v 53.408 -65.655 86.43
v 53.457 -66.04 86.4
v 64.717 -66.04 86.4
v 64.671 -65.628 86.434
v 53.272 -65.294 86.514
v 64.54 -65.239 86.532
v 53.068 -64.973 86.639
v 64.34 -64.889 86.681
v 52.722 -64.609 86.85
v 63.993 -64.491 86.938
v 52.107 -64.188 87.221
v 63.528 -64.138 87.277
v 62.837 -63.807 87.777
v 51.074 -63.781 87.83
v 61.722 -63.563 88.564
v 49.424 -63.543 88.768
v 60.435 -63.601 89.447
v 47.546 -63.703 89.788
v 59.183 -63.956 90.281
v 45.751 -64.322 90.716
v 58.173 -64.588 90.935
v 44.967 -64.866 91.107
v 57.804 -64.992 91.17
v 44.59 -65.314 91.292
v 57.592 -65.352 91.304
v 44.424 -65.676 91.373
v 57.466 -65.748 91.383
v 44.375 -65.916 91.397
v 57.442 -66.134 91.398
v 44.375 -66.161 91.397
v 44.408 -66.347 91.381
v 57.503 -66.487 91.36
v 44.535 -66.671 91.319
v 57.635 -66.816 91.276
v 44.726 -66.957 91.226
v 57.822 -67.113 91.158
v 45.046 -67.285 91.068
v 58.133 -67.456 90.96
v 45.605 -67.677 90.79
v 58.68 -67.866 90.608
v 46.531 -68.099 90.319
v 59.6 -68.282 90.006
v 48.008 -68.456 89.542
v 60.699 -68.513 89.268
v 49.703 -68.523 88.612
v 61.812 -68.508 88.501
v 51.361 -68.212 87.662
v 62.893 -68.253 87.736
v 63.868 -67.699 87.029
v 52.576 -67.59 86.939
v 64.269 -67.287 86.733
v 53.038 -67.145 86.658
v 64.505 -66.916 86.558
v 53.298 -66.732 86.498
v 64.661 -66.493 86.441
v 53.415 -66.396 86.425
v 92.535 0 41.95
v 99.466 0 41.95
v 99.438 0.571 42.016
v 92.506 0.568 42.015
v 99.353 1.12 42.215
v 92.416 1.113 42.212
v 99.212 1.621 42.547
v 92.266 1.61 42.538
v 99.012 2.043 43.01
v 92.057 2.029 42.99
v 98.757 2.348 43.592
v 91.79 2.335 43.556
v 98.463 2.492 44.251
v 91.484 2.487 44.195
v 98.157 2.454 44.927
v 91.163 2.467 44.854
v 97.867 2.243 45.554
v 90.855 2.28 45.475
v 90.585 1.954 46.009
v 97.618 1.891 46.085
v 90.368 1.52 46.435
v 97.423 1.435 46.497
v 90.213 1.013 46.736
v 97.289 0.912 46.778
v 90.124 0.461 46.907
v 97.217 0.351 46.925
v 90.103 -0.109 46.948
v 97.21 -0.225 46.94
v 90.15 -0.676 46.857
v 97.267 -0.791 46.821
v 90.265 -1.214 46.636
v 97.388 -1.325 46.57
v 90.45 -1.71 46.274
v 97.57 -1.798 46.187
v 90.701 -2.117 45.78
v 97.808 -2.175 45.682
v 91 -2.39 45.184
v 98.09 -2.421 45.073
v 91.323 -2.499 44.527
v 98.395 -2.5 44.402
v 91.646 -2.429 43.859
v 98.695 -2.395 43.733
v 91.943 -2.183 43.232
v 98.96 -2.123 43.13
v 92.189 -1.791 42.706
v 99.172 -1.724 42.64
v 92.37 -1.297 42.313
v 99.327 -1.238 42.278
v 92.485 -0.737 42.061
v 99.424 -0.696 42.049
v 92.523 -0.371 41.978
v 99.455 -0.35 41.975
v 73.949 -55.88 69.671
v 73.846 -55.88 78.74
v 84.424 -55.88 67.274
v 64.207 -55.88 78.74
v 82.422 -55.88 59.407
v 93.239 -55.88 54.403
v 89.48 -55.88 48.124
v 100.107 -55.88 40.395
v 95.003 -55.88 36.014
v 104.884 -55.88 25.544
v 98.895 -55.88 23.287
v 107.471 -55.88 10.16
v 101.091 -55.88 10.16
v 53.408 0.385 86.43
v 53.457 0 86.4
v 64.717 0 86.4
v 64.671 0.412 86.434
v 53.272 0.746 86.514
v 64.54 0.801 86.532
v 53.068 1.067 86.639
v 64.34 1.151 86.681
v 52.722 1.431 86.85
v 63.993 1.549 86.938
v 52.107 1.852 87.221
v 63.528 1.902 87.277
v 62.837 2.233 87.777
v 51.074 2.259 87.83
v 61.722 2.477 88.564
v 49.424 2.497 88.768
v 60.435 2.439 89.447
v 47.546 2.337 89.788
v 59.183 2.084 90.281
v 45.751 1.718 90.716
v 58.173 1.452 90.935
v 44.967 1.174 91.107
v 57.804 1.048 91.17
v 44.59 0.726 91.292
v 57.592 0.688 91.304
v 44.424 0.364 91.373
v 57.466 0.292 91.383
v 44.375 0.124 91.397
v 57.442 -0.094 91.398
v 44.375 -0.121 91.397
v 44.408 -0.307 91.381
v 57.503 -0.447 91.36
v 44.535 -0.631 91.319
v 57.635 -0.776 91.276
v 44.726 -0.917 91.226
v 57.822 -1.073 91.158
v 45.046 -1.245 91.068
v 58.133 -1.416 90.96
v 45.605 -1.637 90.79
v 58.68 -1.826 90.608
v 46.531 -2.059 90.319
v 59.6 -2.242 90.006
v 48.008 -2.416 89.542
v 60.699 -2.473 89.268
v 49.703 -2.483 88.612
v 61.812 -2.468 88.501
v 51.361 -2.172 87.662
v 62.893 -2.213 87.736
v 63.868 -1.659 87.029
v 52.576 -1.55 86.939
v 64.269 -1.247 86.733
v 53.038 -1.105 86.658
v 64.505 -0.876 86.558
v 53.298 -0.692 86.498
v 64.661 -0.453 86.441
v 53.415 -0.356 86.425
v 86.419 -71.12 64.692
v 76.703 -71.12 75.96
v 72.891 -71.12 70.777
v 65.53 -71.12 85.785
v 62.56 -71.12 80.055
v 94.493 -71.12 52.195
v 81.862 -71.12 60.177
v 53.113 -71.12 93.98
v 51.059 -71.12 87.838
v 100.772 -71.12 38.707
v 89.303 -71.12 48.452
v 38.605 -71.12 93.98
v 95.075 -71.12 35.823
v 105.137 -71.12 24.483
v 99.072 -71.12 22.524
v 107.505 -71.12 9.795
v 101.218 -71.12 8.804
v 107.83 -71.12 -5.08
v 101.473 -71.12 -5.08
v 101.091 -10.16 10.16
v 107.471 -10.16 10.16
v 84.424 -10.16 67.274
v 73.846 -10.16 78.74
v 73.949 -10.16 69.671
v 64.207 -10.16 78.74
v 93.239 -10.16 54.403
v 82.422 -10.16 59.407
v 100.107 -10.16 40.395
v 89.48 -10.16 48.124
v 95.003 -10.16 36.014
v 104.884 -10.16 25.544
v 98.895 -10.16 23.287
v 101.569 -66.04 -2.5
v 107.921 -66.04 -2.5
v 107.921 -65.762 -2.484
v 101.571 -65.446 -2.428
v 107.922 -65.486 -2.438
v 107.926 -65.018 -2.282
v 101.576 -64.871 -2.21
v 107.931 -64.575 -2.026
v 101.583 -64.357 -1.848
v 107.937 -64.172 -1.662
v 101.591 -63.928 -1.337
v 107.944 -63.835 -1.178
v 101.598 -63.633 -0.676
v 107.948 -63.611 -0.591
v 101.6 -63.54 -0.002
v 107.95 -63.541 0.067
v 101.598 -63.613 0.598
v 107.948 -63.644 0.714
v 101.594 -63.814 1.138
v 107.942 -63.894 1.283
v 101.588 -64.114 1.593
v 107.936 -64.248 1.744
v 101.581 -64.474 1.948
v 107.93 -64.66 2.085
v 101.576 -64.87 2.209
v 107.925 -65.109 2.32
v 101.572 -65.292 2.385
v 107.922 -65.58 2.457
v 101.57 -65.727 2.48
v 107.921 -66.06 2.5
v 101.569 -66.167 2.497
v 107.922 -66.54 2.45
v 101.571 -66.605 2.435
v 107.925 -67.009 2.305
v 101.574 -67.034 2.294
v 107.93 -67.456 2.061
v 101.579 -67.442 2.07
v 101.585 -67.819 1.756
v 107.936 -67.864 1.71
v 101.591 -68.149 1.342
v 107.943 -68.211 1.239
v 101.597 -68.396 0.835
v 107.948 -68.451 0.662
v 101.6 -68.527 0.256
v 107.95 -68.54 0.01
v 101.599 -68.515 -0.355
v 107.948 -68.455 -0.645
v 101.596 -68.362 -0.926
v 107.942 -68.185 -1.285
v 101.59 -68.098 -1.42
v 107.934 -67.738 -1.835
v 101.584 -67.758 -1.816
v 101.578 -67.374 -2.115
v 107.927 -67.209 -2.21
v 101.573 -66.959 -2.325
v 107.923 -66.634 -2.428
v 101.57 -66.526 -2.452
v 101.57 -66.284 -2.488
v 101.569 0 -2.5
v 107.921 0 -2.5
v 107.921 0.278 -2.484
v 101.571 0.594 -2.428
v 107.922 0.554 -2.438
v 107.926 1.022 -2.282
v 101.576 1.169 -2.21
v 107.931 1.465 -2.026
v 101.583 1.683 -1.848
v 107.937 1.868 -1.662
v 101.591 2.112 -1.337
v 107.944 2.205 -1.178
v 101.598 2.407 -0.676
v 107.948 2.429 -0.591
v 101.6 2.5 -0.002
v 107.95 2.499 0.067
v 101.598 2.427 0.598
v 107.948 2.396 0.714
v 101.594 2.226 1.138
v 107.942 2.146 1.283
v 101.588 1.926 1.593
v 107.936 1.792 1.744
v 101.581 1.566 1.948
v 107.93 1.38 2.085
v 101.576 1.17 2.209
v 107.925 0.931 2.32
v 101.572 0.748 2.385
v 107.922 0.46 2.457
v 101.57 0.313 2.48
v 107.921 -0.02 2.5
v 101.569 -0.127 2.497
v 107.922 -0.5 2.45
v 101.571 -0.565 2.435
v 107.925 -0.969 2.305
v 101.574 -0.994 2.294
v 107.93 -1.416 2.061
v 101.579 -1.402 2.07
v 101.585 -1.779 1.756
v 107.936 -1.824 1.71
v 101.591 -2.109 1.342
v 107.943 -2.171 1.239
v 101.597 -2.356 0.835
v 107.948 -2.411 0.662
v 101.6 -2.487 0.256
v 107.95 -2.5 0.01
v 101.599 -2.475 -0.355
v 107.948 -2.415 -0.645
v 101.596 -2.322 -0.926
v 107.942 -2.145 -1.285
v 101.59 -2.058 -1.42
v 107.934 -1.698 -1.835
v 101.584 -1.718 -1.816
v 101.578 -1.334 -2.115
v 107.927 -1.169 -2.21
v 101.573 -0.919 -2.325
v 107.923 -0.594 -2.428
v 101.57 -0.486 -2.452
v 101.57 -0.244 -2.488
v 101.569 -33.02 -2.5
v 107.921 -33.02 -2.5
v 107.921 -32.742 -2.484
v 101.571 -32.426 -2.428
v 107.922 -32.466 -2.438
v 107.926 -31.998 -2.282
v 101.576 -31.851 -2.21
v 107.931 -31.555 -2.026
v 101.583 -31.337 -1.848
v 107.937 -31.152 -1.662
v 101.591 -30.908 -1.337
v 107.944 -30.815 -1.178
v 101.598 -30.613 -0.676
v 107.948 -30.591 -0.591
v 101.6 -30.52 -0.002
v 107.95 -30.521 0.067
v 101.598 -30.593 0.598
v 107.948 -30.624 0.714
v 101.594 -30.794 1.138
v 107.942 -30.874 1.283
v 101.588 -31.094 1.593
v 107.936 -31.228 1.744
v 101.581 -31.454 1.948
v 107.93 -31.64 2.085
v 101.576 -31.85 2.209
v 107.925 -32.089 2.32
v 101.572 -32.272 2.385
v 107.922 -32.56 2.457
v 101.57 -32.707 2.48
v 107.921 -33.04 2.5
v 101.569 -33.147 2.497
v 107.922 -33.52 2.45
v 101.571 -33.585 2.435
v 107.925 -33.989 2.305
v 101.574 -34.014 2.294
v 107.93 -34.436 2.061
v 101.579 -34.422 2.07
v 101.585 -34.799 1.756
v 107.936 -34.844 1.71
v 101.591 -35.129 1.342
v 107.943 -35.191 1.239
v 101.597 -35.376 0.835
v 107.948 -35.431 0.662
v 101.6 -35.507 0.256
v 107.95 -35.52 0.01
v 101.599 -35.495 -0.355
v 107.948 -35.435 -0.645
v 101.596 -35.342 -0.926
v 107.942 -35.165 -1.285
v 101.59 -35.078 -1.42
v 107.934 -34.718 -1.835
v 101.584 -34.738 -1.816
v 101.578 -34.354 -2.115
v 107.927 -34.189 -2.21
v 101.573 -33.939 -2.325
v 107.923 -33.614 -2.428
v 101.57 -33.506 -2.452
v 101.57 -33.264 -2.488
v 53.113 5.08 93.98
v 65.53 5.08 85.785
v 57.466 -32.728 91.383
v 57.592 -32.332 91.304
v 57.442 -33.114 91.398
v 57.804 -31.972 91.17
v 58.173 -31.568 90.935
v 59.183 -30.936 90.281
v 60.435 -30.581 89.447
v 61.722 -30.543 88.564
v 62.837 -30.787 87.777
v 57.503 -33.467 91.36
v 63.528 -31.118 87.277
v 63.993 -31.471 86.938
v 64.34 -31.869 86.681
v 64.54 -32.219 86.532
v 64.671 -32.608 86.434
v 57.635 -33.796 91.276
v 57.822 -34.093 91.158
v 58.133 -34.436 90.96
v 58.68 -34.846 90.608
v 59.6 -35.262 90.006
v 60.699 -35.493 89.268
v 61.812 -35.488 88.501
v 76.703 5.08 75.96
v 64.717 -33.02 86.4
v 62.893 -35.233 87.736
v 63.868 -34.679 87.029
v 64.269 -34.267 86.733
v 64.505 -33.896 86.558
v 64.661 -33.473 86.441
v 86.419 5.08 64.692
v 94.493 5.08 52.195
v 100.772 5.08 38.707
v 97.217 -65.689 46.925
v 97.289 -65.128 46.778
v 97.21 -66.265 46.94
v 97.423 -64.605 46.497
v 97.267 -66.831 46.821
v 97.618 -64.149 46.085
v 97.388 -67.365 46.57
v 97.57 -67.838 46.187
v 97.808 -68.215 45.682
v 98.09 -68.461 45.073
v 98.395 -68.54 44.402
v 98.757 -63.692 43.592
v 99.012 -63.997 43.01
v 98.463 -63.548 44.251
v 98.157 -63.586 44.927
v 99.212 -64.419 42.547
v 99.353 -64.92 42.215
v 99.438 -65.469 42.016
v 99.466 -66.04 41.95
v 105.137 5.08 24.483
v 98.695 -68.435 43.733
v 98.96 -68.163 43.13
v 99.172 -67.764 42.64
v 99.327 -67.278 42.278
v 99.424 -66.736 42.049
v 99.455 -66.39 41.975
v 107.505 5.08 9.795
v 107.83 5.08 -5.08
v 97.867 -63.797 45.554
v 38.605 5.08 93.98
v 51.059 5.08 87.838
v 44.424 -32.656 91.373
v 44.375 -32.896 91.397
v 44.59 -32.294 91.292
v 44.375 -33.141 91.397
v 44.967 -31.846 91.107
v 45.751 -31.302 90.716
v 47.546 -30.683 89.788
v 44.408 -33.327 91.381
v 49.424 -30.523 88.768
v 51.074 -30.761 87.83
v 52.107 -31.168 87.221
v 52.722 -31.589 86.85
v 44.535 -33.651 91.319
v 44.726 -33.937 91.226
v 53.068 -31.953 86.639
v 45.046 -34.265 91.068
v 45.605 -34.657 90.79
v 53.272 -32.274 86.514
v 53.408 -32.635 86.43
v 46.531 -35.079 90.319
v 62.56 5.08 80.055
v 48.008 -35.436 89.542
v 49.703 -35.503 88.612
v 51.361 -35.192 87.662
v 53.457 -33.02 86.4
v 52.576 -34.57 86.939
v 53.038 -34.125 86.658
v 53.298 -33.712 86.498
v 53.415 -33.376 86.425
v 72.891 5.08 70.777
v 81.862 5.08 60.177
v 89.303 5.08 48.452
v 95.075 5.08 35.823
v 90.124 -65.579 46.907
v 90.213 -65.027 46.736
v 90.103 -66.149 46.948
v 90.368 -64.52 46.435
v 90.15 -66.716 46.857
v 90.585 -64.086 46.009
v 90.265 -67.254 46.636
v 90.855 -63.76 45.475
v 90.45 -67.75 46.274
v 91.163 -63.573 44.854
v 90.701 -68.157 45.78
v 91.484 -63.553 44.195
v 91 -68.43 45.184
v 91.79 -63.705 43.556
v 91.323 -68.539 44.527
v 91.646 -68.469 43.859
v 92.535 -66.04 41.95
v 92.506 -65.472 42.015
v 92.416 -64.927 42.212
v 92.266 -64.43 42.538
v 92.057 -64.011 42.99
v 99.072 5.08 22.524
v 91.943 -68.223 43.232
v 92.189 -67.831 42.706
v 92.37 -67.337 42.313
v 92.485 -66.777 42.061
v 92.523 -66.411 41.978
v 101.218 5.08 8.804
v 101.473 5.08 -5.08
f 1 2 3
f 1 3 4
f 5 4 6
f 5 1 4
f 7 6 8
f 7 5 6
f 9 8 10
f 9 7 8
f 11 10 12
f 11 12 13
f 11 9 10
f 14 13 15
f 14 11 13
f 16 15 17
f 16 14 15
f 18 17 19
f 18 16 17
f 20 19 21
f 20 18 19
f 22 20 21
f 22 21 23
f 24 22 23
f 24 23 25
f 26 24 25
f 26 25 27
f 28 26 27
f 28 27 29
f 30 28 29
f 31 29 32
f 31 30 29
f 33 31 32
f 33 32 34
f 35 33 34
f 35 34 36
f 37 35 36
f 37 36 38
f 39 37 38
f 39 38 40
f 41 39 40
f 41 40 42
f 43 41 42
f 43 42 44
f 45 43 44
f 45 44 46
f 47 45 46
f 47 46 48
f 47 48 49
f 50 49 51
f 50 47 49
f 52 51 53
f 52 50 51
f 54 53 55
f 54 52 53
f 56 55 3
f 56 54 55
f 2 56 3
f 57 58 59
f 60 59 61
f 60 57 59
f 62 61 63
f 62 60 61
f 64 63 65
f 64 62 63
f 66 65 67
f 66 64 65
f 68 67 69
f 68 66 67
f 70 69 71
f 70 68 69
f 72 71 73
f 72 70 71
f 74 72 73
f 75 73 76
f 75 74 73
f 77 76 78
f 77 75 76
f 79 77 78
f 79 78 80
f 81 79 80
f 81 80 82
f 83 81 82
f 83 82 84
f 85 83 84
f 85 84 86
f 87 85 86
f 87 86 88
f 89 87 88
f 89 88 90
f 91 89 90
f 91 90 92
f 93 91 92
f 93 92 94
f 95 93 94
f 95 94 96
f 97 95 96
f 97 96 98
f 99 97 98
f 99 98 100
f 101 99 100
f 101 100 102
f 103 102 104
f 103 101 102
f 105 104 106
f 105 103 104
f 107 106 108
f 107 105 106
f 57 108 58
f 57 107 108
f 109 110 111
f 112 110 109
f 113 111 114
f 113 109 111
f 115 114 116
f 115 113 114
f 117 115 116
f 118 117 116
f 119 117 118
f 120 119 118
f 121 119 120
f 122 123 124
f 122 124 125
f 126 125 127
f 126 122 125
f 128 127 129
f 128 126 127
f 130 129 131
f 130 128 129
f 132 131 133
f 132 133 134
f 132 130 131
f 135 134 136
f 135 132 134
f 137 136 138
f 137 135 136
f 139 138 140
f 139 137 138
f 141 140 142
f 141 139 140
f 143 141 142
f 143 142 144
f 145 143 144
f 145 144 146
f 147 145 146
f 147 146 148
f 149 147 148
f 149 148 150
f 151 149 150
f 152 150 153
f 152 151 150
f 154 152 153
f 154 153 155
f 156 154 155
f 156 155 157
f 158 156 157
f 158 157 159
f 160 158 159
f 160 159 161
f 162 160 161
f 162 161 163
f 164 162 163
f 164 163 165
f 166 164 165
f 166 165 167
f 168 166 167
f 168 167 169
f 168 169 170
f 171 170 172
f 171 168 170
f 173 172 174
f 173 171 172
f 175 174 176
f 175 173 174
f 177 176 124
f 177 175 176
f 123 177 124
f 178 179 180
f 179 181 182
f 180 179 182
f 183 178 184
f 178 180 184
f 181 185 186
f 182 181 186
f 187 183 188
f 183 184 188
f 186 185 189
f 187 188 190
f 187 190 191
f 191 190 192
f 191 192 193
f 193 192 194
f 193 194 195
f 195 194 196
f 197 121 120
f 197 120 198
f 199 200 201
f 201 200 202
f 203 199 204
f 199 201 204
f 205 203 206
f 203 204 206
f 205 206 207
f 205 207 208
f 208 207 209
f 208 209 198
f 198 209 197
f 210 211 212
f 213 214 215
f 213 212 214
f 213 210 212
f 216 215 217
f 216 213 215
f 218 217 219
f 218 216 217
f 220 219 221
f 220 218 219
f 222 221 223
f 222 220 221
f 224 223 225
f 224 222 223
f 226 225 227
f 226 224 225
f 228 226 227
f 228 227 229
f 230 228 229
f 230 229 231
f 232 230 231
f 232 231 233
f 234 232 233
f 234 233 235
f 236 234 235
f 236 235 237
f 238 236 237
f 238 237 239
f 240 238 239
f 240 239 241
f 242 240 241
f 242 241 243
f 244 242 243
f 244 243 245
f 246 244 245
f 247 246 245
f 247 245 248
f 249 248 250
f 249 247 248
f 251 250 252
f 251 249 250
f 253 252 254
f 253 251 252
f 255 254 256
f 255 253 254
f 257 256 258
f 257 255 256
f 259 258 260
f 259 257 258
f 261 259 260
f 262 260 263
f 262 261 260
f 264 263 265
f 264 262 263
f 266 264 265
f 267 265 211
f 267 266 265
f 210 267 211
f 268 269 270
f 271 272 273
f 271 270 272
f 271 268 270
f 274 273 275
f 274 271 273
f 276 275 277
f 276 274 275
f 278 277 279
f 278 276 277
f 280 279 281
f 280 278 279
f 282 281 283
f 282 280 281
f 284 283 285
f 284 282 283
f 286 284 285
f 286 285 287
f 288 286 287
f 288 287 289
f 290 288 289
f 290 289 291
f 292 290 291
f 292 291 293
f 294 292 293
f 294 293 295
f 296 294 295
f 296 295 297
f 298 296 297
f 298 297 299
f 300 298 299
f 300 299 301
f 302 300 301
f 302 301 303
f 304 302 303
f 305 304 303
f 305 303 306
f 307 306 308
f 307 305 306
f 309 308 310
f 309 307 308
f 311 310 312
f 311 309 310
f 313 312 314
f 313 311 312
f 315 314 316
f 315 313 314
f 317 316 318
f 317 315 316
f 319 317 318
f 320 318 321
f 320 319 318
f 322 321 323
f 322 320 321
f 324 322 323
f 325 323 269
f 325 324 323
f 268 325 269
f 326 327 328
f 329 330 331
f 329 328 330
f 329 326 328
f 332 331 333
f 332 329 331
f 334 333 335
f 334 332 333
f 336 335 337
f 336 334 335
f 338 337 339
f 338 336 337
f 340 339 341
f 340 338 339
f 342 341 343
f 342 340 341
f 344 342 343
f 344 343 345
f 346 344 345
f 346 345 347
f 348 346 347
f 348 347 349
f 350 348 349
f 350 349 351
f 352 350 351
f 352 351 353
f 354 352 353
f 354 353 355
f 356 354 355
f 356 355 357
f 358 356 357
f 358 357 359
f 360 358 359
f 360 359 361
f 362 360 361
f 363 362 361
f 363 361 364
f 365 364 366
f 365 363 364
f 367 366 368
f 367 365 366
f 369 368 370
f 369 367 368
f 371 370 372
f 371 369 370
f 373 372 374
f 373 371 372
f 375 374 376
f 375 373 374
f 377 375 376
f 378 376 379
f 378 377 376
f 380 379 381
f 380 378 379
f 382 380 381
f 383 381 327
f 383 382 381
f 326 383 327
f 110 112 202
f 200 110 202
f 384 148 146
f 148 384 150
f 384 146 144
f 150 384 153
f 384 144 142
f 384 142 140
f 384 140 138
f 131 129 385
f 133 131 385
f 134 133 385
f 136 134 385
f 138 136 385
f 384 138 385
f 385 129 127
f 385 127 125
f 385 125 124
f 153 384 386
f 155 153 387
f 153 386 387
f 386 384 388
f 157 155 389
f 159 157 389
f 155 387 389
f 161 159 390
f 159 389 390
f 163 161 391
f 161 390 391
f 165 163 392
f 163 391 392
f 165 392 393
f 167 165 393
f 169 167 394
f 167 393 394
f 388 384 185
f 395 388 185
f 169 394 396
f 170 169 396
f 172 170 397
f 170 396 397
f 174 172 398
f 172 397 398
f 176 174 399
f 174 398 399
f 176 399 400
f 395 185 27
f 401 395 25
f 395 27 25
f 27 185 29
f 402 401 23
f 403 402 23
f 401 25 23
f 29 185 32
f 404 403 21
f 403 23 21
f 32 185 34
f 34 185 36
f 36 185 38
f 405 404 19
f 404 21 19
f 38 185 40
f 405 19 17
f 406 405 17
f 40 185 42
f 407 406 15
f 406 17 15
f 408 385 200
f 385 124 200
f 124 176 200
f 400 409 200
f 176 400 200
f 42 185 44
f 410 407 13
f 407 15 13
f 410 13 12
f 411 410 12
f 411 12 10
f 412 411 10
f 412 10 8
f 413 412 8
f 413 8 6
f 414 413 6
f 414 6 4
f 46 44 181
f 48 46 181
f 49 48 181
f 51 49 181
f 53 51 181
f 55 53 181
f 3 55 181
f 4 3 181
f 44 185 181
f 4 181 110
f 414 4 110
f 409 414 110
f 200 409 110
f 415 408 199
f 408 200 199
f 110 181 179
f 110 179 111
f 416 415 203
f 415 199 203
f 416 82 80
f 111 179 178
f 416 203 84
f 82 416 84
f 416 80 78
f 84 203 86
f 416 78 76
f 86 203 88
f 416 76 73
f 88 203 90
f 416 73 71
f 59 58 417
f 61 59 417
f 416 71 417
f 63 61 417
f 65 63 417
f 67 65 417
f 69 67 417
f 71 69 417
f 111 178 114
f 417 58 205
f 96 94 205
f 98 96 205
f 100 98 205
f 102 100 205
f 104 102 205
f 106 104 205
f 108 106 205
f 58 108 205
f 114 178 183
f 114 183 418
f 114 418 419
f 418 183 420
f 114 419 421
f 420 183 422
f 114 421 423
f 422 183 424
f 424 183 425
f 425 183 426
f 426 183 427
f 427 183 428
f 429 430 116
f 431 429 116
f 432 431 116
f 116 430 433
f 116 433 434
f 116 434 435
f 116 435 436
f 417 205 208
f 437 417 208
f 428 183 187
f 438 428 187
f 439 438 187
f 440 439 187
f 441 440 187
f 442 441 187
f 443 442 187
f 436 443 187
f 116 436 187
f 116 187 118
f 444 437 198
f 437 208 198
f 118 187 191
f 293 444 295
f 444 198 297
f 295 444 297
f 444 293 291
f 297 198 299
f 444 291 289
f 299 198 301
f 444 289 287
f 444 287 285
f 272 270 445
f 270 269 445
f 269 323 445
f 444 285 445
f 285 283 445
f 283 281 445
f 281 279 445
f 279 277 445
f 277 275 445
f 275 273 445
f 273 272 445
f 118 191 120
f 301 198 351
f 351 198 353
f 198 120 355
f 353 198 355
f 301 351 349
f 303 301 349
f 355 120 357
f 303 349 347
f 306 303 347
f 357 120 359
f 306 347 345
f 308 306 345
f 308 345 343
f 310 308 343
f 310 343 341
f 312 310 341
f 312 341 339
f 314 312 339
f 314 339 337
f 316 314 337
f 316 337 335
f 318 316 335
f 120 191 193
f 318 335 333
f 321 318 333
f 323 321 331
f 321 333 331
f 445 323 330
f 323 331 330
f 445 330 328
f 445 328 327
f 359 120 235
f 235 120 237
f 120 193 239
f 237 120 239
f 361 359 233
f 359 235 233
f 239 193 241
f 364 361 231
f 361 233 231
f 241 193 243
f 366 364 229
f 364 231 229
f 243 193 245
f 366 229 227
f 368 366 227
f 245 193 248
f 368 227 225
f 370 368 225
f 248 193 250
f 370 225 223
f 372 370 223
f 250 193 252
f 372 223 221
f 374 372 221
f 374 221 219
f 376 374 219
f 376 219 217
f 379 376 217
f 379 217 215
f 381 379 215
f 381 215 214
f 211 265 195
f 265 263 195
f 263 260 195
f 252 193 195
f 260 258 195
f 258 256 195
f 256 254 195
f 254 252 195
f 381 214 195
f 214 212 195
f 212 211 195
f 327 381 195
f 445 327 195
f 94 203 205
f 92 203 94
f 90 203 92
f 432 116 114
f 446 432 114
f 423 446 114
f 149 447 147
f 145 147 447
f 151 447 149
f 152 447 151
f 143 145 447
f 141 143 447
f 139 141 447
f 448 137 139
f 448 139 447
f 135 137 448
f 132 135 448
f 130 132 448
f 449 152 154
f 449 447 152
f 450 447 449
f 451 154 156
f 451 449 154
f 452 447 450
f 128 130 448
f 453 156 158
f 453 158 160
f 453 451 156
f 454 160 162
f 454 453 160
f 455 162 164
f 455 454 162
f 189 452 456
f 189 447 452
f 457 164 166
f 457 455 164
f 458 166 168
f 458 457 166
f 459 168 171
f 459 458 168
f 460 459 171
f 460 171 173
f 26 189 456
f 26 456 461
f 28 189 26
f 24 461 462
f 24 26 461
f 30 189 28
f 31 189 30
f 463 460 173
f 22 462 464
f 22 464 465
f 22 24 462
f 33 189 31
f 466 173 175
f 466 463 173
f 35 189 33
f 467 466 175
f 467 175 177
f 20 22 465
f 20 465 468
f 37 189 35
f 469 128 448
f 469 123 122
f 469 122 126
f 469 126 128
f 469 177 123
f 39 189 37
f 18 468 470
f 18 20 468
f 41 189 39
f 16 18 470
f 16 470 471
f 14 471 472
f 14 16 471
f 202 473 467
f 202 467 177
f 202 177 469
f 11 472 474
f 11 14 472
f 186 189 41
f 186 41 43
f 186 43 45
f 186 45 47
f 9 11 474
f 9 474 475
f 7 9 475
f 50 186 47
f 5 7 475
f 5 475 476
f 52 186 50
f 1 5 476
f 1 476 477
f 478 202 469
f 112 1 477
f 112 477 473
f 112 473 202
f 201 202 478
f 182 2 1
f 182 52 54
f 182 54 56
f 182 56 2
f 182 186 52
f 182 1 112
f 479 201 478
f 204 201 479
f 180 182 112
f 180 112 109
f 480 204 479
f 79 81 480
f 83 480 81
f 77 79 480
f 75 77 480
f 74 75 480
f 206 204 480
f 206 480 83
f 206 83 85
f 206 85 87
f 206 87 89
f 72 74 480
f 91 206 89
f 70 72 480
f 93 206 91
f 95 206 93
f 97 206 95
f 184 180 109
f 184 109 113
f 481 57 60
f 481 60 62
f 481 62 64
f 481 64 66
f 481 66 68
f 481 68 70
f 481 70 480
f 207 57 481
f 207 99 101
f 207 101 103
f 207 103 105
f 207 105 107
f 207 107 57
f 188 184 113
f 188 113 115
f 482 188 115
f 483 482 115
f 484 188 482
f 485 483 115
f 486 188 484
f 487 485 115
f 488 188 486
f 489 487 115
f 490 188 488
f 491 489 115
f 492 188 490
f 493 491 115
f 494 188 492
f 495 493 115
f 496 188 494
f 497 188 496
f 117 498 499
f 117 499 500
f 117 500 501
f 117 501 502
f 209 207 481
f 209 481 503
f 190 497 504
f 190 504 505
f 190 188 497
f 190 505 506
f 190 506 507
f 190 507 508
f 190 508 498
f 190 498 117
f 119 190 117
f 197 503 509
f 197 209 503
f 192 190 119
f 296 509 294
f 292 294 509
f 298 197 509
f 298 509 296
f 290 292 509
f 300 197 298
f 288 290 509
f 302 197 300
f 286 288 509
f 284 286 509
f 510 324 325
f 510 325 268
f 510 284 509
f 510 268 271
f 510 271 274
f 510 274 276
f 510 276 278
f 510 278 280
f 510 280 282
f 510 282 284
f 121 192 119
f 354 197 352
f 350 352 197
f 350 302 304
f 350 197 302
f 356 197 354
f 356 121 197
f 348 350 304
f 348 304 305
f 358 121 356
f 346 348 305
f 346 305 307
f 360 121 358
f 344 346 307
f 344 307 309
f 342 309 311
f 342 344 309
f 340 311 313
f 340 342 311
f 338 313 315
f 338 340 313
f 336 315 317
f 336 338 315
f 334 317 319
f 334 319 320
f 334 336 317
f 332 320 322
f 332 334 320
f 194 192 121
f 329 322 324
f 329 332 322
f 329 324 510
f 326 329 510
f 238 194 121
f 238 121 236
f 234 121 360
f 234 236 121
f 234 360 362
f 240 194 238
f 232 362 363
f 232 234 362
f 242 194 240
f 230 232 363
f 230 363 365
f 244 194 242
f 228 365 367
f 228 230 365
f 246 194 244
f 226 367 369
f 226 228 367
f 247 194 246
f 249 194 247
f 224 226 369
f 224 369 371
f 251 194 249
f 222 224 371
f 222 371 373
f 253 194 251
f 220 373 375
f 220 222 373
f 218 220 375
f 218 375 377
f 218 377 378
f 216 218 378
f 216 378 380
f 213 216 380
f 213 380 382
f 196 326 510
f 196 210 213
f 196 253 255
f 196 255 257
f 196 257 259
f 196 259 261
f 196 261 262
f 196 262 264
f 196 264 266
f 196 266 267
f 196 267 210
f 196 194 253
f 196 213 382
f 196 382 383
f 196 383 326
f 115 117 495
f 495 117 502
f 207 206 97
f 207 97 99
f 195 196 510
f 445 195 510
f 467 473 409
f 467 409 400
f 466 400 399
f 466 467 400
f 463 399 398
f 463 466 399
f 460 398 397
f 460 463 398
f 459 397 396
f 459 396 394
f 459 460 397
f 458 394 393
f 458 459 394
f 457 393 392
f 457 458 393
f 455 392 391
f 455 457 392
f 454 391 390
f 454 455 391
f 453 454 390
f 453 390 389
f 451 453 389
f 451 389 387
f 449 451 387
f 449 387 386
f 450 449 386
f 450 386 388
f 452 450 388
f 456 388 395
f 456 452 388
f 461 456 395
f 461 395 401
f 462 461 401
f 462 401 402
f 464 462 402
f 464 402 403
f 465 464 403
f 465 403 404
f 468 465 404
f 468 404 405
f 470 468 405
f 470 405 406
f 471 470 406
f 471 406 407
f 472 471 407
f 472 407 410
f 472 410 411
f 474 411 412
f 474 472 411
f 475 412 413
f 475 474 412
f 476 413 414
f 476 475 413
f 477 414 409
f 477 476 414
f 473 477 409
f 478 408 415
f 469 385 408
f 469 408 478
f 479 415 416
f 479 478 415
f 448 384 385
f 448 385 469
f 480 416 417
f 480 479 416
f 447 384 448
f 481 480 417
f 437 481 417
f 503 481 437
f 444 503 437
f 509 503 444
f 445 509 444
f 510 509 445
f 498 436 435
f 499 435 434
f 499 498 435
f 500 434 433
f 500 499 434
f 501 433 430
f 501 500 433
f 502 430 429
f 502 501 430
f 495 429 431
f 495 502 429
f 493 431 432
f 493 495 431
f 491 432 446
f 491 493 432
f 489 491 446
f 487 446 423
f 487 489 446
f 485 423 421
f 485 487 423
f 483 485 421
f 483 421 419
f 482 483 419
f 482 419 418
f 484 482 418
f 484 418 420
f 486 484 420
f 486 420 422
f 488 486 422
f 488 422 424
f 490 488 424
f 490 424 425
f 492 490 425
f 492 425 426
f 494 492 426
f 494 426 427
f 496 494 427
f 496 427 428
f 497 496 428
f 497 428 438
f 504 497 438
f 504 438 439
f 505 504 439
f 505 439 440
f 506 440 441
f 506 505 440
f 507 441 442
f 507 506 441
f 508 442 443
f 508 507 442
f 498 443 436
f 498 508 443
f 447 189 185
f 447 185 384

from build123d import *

# Parameters (mm, degrees)
SKETCH2_W               = 78.74
SKETCH2_H               = 55.88
SKETCH2_W_2             = 68.58
SKETCH2_H_2             = 45.72
BOSS_EXTRUDE1_DEPTH     = 203.2
SKETCH2_3_W             = 99.06
SKETCH2_3_H             = 76.2
SKETCH2_3_R             = 2.5
SKETCH2_3_W_2           = 78.74
SKETCH2_3_H_2           = 55.88
BOSS_EXTRUDE2_DEPTH     = 107.95
CUT_EXTRUDE1_DEPTH      = 235.90537414
CUT_EXTRUDE1_DEPTH_BACK = 235.90537414
SKETCH1_R               = 101.6
CUT_EXTRUDE3_DEPTH      = 235.905374211
CUT_EXTRUDE3_DEPTH_BACK = 235.905374211
SKETCH3_R               = 615.95
SKETCH3_R_2             = 107.95


with BuildPart() as part:
    # Sketch2 → Boss-Extrude1 (new body)
    with BuildSketch(Plane(origin=(0, 0, 0), x_dir=(0, 0, -1), z_dir=(1, 0, 0))):
        with Locations((-44.45, -33.02)):
            Rectangle(SKETCH2_W, SKETCH2_H)
        with Locations((-44.45, -33.02)):
            Rectangle(SKETCH2_W_2, SKETCH2_H_2, mode=Mode.SUBTRACT)
    extrude(amount=BOSS_EXTRUDE1_DEPTH)

    # Sketch2<3> → Boss-Extrude2 (add)
    with BuildSketch(Plane(origin=(0, 0, 0), x_dir=(0, 0, -1), z_dir=(1, 0, 0))):
        with Locations((-44.45, -33.02)):
            Rectangle(SKETCH2_3_W, SKETCH2_3_H)
        with Locations((0, -33.02)):
            Circle(SKETCH2_3_R, mode=Mode.SUBTRACT)
        with Locations((0, -66.04)):
            Circle(SKETCH2_3_R, mode=Mode.SUBTRACT)
        with Locations((-44.45, -66.04)):
            Circle(SKETCH2_3_R, mode=Mode.SUBTRACT)
        with Locations((-88.9, -66.04)):
            Circle(SKETCH2_3_R, mode=Mode.SUBTRACT)
        with Locations((-88.9, -33.02)):
            Circle(SKETCH2_3_R, mode=Mode.SUBTRACT)
        Circle(SKETCH2_3_R, mode=Mode.SUBTRACT)
        with Locations((-44.45, 0)):
            Circle(SKETCH2_3_R, mode=Mode.SUBTRACT)
        with Locations((-88.9, 0)):
            Circle(SKETCH2_3_R, mode=Mode.SUBTRACT)
        with Locations((-44.45, -33.02)):
            Rectangle(SKETCH2_3_W_2, SKETCH2_3_H_2, mode=Mode.SUBTRACT)
    extrude(amount=BOSS_EXTRUDE2_DEPTH)

    # Sketch1 → Cut-Extrude1 (cut, two sides: drawn at the far end of the back side and taken through both)
    with BuildSketch(Plane(origin=(0, 0, 0), x_dir=(1, 0, 0), z_dir=(0, 1, 0)).offset(-CUT_EXTRUDE1_DEPTH_BACK)):
        Circle(SKETCH1_R)
    extrude(amount=CUT_EXTRUDE1_DEPTH + CUT_EXTRUDE1_DEPTH_BACK, mode=Mode.SUBTRACT)

    # Sketch3 → Cut-Extrude3 (cut, two sides: drawn at the far end of the back side and taken through both)
    with BuildSketch(Plane(origin=(0, 0, 0), x_dir=(1, 0, 0), z_dir=(0, 1, 0)).offset(-CUT_EXTRUDE3_DEPTH_BACK)):
        Circle(SKETCH3_R)
        Circle(SKETCH3_R_2, mode=Mode.SUBTRACT)
    extrude(amount=CUT_EXTRUDE3_DEPTH + CUT_EXTRUDE3_DEPTH_BACK, mode=Mode.SUBTRACT)


solid = part.part
